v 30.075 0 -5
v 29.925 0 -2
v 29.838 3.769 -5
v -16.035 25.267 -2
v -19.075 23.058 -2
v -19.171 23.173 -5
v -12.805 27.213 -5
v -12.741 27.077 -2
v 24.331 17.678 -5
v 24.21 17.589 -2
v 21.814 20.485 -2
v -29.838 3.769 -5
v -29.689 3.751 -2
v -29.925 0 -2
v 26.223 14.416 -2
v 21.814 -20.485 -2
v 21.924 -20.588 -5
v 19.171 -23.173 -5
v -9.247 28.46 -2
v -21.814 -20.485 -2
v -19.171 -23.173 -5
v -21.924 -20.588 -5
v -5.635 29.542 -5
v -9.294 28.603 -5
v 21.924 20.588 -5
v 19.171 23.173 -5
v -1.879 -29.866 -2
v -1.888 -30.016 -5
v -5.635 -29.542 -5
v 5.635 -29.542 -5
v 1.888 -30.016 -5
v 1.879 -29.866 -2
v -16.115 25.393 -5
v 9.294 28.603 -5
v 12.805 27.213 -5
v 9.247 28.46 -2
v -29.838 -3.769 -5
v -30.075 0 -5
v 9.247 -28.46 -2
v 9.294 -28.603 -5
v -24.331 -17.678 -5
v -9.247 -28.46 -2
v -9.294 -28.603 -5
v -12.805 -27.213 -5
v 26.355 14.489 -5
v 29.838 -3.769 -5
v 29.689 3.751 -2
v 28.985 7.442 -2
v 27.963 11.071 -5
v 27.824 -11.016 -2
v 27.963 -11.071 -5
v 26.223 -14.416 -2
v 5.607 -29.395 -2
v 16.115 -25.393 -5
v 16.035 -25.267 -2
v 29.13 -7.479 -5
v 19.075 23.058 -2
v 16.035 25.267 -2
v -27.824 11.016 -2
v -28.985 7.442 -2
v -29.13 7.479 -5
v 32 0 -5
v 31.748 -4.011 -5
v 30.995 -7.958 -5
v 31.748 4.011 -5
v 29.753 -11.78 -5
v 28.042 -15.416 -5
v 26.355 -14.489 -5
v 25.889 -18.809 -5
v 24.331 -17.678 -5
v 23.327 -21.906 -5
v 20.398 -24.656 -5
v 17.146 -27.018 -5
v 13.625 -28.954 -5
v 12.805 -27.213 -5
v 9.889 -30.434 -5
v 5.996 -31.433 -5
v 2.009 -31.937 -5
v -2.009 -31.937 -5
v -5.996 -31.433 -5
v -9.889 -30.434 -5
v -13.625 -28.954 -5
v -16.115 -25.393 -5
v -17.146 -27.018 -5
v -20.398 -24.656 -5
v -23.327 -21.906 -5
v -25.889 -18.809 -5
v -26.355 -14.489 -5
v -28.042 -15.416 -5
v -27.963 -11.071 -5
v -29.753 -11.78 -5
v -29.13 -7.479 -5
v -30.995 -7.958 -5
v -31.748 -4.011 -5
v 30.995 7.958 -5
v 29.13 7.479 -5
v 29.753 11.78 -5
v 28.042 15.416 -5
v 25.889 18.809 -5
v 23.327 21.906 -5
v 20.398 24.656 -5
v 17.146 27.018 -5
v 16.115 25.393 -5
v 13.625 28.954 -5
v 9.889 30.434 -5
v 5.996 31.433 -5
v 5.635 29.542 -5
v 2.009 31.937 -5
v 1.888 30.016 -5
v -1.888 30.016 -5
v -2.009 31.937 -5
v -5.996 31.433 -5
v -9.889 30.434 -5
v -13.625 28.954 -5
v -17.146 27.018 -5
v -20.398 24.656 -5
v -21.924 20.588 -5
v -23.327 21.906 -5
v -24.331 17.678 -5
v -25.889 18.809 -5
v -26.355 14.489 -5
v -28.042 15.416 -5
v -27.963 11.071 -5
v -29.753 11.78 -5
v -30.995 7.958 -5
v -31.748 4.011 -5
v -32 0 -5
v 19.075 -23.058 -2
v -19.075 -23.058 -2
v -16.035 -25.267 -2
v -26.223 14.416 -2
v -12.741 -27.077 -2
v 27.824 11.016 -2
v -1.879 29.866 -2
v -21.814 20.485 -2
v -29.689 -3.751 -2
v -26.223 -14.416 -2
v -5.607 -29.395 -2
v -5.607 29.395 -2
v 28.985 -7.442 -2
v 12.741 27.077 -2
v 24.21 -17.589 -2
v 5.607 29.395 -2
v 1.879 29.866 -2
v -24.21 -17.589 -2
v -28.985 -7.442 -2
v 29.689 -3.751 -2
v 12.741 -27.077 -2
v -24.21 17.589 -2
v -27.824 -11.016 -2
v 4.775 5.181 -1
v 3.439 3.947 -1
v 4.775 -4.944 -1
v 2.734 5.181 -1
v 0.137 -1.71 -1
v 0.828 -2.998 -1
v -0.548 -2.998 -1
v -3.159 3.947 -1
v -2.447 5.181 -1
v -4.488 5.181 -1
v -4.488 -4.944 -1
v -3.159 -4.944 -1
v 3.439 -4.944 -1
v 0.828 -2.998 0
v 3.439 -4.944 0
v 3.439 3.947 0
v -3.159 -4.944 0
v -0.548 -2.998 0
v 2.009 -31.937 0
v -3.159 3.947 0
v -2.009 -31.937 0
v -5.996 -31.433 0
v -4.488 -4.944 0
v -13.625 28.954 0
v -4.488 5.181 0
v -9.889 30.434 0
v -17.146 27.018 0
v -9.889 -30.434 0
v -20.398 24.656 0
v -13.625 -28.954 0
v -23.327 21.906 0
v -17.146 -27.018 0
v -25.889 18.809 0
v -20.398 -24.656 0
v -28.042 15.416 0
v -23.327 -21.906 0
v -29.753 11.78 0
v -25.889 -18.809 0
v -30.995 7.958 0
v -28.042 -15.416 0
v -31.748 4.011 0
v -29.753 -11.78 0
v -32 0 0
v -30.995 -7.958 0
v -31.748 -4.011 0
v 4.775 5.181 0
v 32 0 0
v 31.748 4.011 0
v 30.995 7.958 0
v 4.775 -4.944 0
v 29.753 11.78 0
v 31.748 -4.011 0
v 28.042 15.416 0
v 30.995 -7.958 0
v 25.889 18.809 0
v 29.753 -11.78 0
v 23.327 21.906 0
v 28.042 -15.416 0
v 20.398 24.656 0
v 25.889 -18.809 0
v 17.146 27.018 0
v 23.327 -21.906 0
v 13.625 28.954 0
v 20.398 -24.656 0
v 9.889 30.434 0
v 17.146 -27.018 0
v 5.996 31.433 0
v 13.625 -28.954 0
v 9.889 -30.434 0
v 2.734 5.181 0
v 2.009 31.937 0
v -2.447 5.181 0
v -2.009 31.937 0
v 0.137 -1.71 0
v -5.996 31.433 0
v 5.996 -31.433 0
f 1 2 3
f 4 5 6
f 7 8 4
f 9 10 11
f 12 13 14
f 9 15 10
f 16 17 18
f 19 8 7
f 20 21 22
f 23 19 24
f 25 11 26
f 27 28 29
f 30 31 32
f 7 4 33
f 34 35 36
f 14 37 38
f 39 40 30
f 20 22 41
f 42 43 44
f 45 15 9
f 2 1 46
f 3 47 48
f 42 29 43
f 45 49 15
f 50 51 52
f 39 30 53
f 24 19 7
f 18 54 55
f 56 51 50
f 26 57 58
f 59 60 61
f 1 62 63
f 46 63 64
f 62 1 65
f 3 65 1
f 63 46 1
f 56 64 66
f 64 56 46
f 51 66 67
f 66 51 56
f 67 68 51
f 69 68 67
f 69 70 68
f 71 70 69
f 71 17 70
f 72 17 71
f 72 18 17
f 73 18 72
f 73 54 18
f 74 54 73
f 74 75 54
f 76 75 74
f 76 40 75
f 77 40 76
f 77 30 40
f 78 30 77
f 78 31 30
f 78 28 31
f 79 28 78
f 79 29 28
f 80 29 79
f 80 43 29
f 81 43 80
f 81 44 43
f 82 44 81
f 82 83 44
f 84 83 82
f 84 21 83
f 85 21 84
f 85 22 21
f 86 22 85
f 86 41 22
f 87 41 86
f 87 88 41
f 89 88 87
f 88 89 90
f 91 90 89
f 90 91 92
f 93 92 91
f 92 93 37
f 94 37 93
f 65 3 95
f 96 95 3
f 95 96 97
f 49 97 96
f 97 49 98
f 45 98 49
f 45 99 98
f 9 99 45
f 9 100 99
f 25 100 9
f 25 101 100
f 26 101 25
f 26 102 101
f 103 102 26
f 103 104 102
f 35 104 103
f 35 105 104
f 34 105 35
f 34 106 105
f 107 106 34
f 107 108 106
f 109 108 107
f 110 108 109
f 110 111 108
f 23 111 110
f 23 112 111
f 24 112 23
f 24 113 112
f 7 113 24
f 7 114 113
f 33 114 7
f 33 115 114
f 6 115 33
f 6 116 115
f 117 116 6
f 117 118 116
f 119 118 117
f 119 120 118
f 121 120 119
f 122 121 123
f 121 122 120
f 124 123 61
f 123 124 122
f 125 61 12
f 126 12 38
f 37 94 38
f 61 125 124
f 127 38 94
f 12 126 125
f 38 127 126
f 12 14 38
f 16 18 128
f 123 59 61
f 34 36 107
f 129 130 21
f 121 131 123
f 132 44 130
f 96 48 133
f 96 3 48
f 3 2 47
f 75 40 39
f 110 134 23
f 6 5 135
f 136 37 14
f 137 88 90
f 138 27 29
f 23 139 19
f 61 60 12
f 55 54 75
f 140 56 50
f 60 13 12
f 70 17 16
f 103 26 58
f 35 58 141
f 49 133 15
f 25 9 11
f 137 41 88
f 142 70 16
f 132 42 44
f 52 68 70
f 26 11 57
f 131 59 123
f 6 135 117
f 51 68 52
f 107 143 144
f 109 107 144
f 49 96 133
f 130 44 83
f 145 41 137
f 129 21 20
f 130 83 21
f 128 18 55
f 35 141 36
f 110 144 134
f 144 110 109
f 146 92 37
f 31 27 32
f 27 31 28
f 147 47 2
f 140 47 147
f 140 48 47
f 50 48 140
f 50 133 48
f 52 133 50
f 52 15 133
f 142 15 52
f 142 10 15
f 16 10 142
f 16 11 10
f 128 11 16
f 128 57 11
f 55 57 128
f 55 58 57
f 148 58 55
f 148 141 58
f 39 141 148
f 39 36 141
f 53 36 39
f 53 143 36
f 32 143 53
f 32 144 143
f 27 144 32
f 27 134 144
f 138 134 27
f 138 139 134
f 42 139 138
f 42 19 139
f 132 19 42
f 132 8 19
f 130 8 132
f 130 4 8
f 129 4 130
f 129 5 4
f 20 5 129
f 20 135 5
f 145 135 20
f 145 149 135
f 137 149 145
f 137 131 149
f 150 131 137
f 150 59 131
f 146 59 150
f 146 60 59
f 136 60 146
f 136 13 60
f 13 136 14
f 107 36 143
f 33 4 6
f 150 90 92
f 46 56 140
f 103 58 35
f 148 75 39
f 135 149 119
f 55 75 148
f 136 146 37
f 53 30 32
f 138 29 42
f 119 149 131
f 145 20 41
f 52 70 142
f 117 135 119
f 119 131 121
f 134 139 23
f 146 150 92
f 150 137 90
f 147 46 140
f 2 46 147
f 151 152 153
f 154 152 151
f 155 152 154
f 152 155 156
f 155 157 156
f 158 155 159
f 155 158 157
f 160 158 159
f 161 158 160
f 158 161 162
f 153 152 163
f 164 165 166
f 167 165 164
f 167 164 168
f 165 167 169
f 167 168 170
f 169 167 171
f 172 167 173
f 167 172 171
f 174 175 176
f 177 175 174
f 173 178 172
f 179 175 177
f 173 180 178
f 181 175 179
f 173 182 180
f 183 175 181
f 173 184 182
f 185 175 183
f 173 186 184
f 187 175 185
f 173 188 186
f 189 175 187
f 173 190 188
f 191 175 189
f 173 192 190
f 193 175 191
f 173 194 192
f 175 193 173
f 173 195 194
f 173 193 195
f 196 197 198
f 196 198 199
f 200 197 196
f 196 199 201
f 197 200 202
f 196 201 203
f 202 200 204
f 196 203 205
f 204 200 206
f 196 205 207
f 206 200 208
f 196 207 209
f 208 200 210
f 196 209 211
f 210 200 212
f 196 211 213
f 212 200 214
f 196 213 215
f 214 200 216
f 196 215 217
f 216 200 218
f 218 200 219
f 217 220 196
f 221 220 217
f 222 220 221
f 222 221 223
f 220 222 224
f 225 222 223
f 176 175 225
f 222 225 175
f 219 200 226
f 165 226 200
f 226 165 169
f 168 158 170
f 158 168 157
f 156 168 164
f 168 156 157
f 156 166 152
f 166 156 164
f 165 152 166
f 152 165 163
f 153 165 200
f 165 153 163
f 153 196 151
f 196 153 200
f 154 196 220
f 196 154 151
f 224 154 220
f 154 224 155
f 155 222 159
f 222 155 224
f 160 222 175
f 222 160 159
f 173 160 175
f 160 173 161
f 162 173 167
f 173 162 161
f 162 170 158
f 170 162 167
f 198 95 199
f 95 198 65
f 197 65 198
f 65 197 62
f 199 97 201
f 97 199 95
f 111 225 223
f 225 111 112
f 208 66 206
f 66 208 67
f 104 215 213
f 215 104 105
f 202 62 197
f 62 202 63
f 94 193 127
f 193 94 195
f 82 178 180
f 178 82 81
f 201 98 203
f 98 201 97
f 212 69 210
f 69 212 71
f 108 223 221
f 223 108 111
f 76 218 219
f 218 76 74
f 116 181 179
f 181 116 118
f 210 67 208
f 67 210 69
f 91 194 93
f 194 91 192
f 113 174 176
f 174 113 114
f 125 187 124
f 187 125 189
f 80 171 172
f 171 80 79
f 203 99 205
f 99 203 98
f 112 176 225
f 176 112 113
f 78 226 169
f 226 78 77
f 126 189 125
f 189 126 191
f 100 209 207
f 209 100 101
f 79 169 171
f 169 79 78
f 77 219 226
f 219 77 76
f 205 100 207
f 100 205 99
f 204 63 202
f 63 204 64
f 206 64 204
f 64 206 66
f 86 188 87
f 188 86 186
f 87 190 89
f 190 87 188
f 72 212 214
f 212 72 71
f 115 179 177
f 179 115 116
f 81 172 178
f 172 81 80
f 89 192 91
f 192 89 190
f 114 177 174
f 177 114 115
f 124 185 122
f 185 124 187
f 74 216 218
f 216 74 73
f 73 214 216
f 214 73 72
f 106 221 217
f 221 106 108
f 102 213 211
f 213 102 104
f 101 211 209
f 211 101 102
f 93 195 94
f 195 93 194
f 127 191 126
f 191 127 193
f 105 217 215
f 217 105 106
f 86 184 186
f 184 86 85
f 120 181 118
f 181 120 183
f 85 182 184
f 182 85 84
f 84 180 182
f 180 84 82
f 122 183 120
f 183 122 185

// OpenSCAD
$fn = 50;


difference() {
	union() {
		translate(v = [0, 0, -5.0000000000]) {
			cylinder(h = 5, r = 32.0000000000);
		}
	}
	union() {
		#translate(v = [0, 0, -5.0000000000]) {
			cylinder(h = 3, r1 = 30.0750000000, r2 = 29.9250000000);
		}
		translate(v = [0, 0, -1]) {
			linear_extrude(height = 1) {
				text(font = "Impact", halign = "center", size = 10, text = "M", valign = "center");
			}
		}
	}
}
